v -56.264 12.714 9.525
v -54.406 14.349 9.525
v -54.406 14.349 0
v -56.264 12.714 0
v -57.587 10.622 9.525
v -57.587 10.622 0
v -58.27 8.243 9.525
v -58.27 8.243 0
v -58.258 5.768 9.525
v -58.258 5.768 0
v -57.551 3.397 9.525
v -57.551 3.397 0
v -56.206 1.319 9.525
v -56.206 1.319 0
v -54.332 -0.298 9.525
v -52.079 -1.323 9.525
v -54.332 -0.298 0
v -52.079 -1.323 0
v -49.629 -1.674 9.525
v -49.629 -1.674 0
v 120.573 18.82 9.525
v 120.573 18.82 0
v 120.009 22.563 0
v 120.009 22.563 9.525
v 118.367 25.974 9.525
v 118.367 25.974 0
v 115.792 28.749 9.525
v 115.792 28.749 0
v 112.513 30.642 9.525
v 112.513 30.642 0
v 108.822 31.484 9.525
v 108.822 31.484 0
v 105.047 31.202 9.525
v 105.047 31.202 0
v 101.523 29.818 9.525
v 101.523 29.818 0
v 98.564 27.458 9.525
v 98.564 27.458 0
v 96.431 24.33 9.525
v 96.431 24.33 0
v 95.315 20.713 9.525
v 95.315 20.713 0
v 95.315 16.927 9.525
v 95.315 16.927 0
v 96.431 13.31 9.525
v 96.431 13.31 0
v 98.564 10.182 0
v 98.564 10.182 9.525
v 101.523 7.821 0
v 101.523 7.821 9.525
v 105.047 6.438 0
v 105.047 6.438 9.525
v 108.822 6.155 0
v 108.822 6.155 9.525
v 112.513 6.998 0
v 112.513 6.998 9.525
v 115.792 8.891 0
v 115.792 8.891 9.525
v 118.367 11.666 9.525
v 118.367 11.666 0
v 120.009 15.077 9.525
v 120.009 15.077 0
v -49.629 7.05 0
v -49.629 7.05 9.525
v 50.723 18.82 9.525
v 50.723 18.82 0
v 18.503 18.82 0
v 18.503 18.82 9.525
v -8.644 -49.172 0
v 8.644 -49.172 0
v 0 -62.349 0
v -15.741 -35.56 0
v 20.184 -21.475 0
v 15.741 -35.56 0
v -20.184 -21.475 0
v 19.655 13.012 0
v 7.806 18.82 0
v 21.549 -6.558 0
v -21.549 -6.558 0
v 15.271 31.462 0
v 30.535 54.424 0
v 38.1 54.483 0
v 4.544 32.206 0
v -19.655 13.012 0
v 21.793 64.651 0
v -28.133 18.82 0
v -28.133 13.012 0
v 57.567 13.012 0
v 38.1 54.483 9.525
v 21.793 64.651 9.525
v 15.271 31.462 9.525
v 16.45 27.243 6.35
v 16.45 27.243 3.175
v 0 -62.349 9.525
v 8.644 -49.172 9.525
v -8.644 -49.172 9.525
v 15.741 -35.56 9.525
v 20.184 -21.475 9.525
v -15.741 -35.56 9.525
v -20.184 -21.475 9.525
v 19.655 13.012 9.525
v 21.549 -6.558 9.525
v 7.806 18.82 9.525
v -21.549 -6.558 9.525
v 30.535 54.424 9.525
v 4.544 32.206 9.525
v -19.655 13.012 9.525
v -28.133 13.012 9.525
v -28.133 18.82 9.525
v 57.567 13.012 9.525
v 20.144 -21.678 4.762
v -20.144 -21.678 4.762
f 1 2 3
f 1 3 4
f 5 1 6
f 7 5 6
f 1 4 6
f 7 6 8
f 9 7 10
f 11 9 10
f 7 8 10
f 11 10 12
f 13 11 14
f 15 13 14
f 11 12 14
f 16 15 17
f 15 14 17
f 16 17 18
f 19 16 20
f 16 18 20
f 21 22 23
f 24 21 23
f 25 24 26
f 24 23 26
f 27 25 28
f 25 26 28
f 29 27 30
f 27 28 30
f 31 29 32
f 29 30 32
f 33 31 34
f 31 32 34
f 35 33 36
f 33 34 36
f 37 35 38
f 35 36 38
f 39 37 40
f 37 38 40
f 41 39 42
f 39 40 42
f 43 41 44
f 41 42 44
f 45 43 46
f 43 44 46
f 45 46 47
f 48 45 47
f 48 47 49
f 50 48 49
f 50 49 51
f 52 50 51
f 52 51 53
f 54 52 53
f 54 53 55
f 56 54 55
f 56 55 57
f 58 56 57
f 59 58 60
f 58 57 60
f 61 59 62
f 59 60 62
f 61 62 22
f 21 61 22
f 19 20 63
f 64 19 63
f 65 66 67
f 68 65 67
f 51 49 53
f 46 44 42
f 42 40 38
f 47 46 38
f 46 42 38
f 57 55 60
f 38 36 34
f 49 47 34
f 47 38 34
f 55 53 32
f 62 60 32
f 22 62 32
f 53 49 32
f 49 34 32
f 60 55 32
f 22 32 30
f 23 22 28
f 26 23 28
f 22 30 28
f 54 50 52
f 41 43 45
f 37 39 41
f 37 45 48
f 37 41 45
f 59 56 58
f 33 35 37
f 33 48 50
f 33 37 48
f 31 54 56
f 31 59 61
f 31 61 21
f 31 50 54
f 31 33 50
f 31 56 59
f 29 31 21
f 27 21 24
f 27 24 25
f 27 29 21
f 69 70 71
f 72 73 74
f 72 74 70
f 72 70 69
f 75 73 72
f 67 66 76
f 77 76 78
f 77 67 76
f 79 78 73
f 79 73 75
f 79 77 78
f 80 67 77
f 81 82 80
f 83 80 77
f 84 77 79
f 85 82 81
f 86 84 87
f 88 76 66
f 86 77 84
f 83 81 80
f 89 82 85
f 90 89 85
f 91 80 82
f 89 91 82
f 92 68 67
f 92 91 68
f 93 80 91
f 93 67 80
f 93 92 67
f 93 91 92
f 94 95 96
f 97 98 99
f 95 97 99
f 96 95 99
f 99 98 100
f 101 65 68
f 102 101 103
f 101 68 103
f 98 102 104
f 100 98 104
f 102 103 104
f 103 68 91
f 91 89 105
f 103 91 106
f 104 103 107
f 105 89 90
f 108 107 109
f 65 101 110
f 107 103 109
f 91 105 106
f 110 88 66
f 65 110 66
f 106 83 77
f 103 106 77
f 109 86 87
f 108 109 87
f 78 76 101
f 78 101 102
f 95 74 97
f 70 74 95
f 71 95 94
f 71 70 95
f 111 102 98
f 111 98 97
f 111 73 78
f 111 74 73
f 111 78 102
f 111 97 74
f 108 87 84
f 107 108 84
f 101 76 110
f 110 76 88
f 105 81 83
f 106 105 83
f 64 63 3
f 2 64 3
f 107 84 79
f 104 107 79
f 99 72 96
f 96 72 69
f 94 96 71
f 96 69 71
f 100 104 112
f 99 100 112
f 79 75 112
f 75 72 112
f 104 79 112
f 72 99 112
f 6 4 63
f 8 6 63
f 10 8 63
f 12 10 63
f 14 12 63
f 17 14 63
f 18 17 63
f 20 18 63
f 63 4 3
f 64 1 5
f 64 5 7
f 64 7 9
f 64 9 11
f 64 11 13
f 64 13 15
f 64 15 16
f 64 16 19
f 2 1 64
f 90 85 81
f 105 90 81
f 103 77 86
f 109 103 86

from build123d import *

# Parameters (mm, degrees)
F1_DEPTH = 9.525
F0_R     = 12.7


with BuildPart() as f1:
    # F0 (on Top) → F1 (new body)
    with BuildSketch(Plane.XY):
        with BuildLine():
            add(Edge.make_bspline(
                [(15.2706934092, 31.4622362133), (16.4966470738, 27.2431960745), (17.5880205026, 23.0191566811), (18.5030831742, 18.8199616969)],
                knots=[0, 0, 0, 0, 0.1189646058, 0.1189646058, 0.1189646058, 0.1189646058], degree=3))
            Line((15.2706934092, 31.4622362133), (38.1, 54.4833862709))
            Line((38.1, 54.4833862709), (21.7933514928, 64.6510570317))
            Line((21.7933514928, 64.6510570317), (30.5354431679, 54.4244606295))
            Line((30.5354431679, 54.4244606295), (4.5439931576, 32.2059599844))
            Line((4.5439931576, 32.2059599844), (7.8060968021, 18.8199616969))
            Line((7.8060968021, 18.8199616969), (18.5030831742, 18.8199616969))
        make_face()
        with BuildLine():
            Line((50.7233217359, 18.8199616969), (18.5030831742, 18.8199616969))
            add(Edge.make_bspline(
                [(18.5030831742, 18.8199616969), (18.9263009616, 16.8778280429), (19.311804544, 14.9410087961), (19.6554654145, 13.0124564661)],
                knots=[0.1189646058, 0.1189646058, 0.1189646058, 0.1189646058, 0.1739859052, 0.1739859052, 0.1739859052, 0.1739859052], degree=3))
            Line((19.6554654145, 13.0124564661), (57.5669445097, 13.0124564661))
            Line((57.5669445097, 13.0124564661), (50.7233217359, 18.8199616969))
        make_face()
        with BuildLine():
            add(Edge.make_bspline(
                [(18.5030831742, 18.8199616969), (18.9263009616, 16.8778280429), (19.311804544, 14.9410087961), (19.6554654145, 13.0124564661)],
                knots=[0.1189646058, 0.1189646058, 0.1189646058, 0.1189646058, 0.1739859052, 0.1739859052, 0.1739859052, 0.1739859052], degree=3))
            Line((18.5030831742, 18.8199616969), (7.8060968021, 18.8199616969))
            Line((7.8060968021, 18.8199616969), (-7.8060968021, 18.8199616969))
            Line((-7.8060968021, 18.8199616969), (-18.5030831742, 18.8199616969))
            add(Edge.make_bspline(
                [(-18.5030831742, 18.8199616969), (-18.9263009616, 16.8778280429), (-19.311804544, 14.9410087961), (-19.6554654145, 13.0124564661)],
                knots=[0.1189646058, 0.1189646058, 0.1189646058, 0.1189646058, 0.1739859052, 0.1739859052, 0.1739859052, 0.1739859052], degree=3))
            Line((-19.6554654145, 13.0124564661), (-9.2213580005, 13.0124564661))
            Line((-9.2213580005, 13.0124564661), (9.2213580005, 13.0124564661))
            Line((9.2213580005, 13.0124564661), (19.6554654145, 13.0124564661))
        make_face()
        with BuildLine():
            add(Edge.make_bspline(
                [(19.6554654145, 13.0124564661), (21.8180916964, 0.8762538526), (23.0243339677, -27.2953766692), (8.9446977687, -49.4163074898), (0, -62.3489429683)],
                knots=[0.1739859052, 0.1739859052, 0.1739859052, 0.1739859052, 0.520229887, 1, 1, 1, 1], degree=3))
            Line((19.6554654145, 13.0124564661), (9.2213580005, 13.0124564661))
            Line((9.2213580005, 13.0124564661), (-9.2213580005, 13.0124564661))
            Line((-9.2213580005, 13.0124564661), (-19.6554654145, 13.0124564661))
            add(Edge.make_bspline(
                [(-19.6554654145, 13.0124564661), (-21.8180916964, 0.8762538526), (-23.0243339677, -27.2953766692), (-8.9446977687, -49.4163074898), (0, -62.3489429683)],
                knots=[0.1739859052, 0.1739859052, 0.1739859052, 0.1739859052, 0.520229887, 1, 1, 1, 1], degree=3))
        make_face()
        with BuildLine():
            Line((-28.1332228333, 13.0124564661), (-19.6554654145, 13.0124564661))
            add(Edge.make_bspline(
                [(-18.5030831742, 18.8199616969), (-18.9263009616, 16.8778280429), (-19.311804544, 14.9410087961), (-19.6554654145, 13.0124564661)],
                knots=[0.1189646058, 0.1189646058, 0.1189646058, 0.1189646058, 0.1739859052, 0.1739859052, 0.1739859052, 0.1739859052], degree=3))
            Line((-18.5030831742, 18.8199616969), (-28.1332228333, 18.8199616969))
            Line((-28.1332228333, 18.8199616969), (-28.1332228333, 13.0124564661))
        make_face()
    extrude(amount=F1_DEPTH)


with BuildPart() as f1b:
    # F0 (on Top) → F1, piece 2 (new body)
    with BuildSketch(Plane.XY):
        with BuildLine():
            Line((-49.6290139854, 7.0495842956), (-54.4057596778, 14.3488846976))
            ThreePointArc((-54.4057596778, 14.3488846976), (-57.9887849976, 4.557333427), (-49.6290139854, -1.673780065))
            Line((-49.6290139854, -1.673780065), (-49.6290139854, 7.0495842956))
        make_face()
    extrude(amount=F1_DEPTH)


with BuildPart() as f1c:
    # F0 (on Top) → F1, piece 3 (new body)
    with BuildSketch(Plane.XY):
        with Locations((107.8733217359, 18.8199616969)):
            Circle(F0_R)
    extrude(amount=F1_DEPTH)


solid = Compound([f1.part, f1b.part, f1c.part])
